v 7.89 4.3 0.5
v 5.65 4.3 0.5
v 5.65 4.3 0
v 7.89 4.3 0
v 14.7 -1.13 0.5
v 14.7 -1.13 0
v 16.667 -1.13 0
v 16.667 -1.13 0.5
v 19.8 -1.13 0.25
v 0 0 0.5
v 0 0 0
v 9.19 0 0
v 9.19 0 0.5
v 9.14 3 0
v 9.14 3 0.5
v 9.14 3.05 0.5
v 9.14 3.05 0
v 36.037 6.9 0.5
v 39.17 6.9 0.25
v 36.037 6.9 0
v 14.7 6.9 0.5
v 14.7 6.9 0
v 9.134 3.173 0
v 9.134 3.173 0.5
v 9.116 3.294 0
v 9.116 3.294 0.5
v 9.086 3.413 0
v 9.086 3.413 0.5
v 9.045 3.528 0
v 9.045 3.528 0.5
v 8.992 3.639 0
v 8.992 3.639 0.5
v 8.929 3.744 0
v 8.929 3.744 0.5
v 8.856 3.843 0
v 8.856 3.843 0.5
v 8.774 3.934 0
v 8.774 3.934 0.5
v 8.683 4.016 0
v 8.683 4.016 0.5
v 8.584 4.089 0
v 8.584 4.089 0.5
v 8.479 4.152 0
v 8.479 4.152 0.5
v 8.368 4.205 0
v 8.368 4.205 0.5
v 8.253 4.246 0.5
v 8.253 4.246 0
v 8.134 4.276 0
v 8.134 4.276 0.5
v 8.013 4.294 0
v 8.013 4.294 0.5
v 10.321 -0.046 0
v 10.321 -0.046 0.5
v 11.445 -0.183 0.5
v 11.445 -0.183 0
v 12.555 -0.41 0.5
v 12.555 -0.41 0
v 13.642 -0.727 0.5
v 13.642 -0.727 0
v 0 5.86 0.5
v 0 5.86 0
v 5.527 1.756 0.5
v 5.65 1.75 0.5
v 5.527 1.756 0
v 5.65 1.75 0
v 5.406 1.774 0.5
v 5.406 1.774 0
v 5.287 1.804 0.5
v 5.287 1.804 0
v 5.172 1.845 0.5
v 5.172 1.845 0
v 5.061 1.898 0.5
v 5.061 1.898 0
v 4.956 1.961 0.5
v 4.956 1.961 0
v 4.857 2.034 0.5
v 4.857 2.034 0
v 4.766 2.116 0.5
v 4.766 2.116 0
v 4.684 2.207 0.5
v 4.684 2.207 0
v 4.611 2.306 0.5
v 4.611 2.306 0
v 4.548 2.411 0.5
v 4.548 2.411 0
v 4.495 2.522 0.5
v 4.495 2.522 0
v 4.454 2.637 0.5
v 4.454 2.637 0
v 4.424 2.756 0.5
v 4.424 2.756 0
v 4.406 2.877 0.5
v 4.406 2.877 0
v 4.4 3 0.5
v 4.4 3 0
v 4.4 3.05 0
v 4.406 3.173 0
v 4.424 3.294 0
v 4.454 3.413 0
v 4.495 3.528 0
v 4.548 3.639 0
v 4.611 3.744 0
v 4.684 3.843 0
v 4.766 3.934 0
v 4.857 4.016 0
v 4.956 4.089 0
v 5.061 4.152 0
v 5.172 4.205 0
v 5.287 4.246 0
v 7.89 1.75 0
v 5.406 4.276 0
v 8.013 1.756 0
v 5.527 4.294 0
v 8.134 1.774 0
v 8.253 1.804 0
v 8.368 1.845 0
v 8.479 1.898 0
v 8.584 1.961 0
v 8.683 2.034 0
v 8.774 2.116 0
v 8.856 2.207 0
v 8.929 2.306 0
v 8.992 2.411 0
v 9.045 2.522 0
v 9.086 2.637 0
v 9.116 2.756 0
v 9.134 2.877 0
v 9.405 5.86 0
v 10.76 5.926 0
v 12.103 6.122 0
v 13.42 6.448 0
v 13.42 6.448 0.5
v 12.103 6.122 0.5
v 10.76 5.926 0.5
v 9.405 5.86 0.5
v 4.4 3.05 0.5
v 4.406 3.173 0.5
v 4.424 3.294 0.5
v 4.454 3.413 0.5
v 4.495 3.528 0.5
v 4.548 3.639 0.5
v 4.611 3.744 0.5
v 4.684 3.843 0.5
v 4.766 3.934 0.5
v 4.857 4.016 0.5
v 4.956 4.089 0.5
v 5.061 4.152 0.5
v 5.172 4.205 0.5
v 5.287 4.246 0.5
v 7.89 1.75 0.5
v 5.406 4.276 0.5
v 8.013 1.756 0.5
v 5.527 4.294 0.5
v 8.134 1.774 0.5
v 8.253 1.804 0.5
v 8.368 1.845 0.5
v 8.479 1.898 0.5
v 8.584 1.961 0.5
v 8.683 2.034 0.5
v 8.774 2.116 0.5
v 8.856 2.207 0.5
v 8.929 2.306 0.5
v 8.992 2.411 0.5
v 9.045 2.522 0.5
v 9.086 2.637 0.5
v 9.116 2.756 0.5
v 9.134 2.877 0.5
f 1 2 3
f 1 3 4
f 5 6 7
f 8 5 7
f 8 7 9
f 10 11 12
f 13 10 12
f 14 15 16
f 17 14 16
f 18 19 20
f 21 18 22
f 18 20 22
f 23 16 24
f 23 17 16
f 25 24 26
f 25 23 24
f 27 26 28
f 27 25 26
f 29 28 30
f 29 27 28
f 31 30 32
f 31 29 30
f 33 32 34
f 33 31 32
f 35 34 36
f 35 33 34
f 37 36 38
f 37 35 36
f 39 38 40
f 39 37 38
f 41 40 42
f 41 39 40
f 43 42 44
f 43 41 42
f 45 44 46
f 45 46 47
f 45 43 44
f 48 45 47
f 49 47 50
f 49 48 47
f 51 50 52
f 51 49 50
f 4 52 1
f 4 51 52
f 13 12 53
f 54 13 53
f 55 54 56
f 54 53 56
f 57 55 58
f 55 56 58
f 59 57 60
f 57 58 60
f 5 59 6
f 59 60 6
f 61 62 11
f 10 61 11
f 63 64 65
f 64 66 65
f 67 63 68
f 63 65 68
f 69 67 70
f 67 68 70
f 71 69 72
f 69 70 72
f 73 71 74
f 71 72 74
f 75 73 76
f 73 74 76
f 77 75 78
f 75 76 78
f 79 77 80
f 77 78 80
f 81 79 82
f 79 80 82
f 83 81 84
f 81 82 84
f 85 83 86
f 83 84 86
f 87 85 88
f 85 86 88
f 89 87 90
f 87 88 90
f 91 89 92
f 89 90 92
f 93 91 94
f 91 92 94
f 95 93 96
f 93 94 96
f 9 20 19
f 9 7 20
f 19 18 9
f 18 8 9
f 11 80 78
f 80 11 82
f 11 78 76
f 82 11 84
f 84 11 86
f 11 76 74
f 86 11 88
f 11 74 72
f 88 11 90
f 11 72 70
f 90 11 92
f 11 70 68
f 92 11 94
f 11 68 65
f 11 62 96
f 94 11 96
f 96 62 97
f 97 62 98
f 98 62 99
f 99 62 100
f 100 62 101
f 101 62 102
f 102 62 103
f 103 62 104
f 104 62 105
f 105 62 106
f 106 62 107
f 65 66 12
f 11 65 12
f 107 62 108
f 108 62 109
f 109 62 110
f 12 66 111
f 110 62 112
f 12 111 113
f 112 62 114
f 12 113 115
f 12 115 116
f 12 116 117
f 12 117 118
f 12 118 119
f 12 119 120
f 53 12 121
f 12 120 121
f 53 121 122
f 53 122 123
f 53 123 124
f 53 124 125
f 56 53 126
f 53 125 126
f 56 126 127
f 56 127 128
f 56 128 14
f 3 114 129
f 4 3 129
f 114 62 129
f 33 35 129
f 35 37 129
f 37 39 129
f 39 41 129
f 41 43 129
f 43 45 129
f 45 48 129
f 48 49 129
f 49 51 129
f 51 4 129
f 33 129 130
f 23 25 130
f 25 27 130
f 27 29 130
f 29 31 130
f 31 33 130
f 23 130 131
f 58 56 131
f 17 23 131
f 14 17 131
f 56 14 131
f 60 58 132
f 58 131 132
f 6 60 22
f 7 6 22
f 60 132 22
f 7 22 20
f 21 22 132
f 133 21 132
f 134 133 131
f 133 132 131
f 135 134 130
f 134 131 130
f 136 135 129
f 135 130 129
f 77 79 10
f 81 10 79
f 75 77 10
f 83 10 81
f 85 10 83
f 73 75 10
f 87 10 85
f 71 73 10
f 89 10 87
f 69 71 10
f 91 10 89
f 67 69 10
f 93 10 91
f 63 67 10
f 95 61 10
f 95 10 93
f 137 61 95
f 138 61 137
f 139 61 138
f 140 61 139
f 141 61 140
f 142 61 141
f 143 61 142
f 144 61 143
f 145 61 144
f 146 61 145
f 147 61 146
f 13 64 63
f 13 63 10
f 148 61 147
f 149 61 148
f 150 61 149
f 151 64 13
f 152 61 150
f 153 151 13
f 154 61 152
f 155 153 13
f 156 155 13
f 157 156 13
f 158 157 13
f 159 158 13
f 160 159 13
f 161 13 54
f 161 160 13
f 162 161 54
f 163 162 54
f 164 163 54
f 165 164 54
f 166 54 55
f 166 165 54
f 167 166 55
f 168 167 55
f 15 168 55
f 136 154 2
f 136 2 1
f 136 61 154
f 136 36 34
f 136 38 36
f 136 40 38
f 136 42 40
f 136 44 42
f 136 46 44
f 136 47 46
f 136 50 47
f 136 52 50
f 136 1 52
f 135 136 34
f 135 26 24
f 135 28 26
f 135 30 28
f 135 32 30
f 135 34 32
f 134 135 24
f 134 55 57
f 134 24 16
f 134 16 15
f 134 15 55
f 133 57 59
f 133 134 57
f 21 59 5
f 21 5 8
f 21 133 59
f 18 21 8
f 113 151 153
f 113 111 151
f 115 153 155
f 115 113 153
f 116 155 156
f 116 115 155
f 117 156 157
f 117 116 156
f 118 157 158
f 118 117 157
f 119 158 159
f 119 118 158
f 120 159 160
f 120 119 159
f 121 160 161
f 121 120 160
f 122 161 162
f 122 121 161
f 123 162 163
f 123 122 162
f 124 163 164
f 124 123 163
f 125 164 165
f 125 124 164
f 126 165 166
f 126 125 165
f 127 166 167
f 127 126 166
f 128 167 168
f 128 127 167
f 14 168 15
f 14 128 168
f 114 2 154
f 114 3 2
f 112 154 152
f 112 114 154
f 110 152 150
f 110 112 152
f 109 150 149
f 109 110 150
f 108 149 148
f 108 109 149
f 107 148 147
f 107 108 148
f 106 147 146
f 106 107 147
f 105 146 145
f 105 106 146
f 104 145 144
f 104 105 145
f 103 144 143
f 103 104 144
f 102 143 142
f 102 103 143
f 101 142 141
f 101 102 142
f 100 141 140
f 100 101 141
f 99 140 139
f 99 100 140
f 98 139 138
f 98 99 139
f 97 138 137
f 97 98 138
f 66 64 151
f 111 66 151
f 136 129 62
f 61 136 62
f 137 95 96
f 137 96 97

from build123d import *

# Parameters (mm, degrees)
F1_DEPTH    = 0.5
F2_T1_DEPTH = 0.5
F3_W        = 4.74
F3_H        = 2.55
F4_DEPTH    = 0.501
F5_R        = 1.25
F6_SIZE2    = 1.19999
F6_SIZE     = 0.24999


# Not quite as in the source:
# - a fillet or chamfer that OpenCascade refuses, or shapes differently, is made with other operations: its cross-section is extruded or revolved along the edge and cut away or added
# - a fillet or chamfer is up to 0.001 mm smaller than in the source, because OpenCascade refuses the exact size


with BuildPart() as f1:
    # F0 (on Top) → F1 (new body)
    with BuildSketch(Plane.XY):
        Polygon((0, 5.86), (0, 0), (14.7, 0), (14.7, -1.13), (19.8, -1.13), (39.17, 6.9), (14.7, 6.9), (14.7, 5.86), align=None)
    extrude(amount=F1_DEPTH)

    # F2: fillet of radius 14 on 2 edges, made by hand

    # F2_s2 → F2_t1 (join)
    with BuildSketch(Plane.XY):
        with BuildLine():
            ThreePointArc((14.7, 6.9), (12.1030176748, 6.1224601911), (9.4048701621, 5.86))
            Line((9.4048701621, 5.86), (14.7, 5.86))
            Line((14.7, 5.86), (14.7, 6.9))
        make_face()
        with BuildLine():
            ThreePointArc((9.1897277744, 0), (12.0021999965, -0.2854092296), (14.7, -1.13))
            Line((14.7, -1.13), (14.7, 0))
            Line((14.7, 0), (9.1897277744, 0))
        make_face()
    extrude(amount=F2_T1_DEPTH)

    # F3 (on face) → F4 (cut, through all)
    with BuildSketch(Plane.XY.offset(0.5)):
        with Locations((6.77, 3.025)):
            Rectangle(F3_W, F3_H)
    extrude(amount=-F4_DEPTH, mode=Mode.SUBTRACT)

    # F5
    f5_edges = [f1.edges().sort_by_distance(p)[0] for p in [
        (9.14, 1.75, 0.25),
        (4.4, 1.75, 0.25),
        (4.4, 4.3, 0.25),
        (9.14, 4.3, 0.25),
    ]]
    fillet(f5_edges, radius=F5_R)

    # F6 (size 0.25 and 1.2 in the source; OpenCascade refuses exactly that, so slightly less here)
    f6_edges = [f1.edges().sort_by_distance(p)[0] for p in [
        (29.485, 2.885, 0.5),
        (29.485, 2.885, 0),
    ]]
    f6_side = f1.faces().sort_by_distance((29.485, 2.885, 0.25))[0]
    chamfer(f6_edges, length=F6_SIZE, length2=F6_SIZE2, reference=f6_side)


solid = f1.part
